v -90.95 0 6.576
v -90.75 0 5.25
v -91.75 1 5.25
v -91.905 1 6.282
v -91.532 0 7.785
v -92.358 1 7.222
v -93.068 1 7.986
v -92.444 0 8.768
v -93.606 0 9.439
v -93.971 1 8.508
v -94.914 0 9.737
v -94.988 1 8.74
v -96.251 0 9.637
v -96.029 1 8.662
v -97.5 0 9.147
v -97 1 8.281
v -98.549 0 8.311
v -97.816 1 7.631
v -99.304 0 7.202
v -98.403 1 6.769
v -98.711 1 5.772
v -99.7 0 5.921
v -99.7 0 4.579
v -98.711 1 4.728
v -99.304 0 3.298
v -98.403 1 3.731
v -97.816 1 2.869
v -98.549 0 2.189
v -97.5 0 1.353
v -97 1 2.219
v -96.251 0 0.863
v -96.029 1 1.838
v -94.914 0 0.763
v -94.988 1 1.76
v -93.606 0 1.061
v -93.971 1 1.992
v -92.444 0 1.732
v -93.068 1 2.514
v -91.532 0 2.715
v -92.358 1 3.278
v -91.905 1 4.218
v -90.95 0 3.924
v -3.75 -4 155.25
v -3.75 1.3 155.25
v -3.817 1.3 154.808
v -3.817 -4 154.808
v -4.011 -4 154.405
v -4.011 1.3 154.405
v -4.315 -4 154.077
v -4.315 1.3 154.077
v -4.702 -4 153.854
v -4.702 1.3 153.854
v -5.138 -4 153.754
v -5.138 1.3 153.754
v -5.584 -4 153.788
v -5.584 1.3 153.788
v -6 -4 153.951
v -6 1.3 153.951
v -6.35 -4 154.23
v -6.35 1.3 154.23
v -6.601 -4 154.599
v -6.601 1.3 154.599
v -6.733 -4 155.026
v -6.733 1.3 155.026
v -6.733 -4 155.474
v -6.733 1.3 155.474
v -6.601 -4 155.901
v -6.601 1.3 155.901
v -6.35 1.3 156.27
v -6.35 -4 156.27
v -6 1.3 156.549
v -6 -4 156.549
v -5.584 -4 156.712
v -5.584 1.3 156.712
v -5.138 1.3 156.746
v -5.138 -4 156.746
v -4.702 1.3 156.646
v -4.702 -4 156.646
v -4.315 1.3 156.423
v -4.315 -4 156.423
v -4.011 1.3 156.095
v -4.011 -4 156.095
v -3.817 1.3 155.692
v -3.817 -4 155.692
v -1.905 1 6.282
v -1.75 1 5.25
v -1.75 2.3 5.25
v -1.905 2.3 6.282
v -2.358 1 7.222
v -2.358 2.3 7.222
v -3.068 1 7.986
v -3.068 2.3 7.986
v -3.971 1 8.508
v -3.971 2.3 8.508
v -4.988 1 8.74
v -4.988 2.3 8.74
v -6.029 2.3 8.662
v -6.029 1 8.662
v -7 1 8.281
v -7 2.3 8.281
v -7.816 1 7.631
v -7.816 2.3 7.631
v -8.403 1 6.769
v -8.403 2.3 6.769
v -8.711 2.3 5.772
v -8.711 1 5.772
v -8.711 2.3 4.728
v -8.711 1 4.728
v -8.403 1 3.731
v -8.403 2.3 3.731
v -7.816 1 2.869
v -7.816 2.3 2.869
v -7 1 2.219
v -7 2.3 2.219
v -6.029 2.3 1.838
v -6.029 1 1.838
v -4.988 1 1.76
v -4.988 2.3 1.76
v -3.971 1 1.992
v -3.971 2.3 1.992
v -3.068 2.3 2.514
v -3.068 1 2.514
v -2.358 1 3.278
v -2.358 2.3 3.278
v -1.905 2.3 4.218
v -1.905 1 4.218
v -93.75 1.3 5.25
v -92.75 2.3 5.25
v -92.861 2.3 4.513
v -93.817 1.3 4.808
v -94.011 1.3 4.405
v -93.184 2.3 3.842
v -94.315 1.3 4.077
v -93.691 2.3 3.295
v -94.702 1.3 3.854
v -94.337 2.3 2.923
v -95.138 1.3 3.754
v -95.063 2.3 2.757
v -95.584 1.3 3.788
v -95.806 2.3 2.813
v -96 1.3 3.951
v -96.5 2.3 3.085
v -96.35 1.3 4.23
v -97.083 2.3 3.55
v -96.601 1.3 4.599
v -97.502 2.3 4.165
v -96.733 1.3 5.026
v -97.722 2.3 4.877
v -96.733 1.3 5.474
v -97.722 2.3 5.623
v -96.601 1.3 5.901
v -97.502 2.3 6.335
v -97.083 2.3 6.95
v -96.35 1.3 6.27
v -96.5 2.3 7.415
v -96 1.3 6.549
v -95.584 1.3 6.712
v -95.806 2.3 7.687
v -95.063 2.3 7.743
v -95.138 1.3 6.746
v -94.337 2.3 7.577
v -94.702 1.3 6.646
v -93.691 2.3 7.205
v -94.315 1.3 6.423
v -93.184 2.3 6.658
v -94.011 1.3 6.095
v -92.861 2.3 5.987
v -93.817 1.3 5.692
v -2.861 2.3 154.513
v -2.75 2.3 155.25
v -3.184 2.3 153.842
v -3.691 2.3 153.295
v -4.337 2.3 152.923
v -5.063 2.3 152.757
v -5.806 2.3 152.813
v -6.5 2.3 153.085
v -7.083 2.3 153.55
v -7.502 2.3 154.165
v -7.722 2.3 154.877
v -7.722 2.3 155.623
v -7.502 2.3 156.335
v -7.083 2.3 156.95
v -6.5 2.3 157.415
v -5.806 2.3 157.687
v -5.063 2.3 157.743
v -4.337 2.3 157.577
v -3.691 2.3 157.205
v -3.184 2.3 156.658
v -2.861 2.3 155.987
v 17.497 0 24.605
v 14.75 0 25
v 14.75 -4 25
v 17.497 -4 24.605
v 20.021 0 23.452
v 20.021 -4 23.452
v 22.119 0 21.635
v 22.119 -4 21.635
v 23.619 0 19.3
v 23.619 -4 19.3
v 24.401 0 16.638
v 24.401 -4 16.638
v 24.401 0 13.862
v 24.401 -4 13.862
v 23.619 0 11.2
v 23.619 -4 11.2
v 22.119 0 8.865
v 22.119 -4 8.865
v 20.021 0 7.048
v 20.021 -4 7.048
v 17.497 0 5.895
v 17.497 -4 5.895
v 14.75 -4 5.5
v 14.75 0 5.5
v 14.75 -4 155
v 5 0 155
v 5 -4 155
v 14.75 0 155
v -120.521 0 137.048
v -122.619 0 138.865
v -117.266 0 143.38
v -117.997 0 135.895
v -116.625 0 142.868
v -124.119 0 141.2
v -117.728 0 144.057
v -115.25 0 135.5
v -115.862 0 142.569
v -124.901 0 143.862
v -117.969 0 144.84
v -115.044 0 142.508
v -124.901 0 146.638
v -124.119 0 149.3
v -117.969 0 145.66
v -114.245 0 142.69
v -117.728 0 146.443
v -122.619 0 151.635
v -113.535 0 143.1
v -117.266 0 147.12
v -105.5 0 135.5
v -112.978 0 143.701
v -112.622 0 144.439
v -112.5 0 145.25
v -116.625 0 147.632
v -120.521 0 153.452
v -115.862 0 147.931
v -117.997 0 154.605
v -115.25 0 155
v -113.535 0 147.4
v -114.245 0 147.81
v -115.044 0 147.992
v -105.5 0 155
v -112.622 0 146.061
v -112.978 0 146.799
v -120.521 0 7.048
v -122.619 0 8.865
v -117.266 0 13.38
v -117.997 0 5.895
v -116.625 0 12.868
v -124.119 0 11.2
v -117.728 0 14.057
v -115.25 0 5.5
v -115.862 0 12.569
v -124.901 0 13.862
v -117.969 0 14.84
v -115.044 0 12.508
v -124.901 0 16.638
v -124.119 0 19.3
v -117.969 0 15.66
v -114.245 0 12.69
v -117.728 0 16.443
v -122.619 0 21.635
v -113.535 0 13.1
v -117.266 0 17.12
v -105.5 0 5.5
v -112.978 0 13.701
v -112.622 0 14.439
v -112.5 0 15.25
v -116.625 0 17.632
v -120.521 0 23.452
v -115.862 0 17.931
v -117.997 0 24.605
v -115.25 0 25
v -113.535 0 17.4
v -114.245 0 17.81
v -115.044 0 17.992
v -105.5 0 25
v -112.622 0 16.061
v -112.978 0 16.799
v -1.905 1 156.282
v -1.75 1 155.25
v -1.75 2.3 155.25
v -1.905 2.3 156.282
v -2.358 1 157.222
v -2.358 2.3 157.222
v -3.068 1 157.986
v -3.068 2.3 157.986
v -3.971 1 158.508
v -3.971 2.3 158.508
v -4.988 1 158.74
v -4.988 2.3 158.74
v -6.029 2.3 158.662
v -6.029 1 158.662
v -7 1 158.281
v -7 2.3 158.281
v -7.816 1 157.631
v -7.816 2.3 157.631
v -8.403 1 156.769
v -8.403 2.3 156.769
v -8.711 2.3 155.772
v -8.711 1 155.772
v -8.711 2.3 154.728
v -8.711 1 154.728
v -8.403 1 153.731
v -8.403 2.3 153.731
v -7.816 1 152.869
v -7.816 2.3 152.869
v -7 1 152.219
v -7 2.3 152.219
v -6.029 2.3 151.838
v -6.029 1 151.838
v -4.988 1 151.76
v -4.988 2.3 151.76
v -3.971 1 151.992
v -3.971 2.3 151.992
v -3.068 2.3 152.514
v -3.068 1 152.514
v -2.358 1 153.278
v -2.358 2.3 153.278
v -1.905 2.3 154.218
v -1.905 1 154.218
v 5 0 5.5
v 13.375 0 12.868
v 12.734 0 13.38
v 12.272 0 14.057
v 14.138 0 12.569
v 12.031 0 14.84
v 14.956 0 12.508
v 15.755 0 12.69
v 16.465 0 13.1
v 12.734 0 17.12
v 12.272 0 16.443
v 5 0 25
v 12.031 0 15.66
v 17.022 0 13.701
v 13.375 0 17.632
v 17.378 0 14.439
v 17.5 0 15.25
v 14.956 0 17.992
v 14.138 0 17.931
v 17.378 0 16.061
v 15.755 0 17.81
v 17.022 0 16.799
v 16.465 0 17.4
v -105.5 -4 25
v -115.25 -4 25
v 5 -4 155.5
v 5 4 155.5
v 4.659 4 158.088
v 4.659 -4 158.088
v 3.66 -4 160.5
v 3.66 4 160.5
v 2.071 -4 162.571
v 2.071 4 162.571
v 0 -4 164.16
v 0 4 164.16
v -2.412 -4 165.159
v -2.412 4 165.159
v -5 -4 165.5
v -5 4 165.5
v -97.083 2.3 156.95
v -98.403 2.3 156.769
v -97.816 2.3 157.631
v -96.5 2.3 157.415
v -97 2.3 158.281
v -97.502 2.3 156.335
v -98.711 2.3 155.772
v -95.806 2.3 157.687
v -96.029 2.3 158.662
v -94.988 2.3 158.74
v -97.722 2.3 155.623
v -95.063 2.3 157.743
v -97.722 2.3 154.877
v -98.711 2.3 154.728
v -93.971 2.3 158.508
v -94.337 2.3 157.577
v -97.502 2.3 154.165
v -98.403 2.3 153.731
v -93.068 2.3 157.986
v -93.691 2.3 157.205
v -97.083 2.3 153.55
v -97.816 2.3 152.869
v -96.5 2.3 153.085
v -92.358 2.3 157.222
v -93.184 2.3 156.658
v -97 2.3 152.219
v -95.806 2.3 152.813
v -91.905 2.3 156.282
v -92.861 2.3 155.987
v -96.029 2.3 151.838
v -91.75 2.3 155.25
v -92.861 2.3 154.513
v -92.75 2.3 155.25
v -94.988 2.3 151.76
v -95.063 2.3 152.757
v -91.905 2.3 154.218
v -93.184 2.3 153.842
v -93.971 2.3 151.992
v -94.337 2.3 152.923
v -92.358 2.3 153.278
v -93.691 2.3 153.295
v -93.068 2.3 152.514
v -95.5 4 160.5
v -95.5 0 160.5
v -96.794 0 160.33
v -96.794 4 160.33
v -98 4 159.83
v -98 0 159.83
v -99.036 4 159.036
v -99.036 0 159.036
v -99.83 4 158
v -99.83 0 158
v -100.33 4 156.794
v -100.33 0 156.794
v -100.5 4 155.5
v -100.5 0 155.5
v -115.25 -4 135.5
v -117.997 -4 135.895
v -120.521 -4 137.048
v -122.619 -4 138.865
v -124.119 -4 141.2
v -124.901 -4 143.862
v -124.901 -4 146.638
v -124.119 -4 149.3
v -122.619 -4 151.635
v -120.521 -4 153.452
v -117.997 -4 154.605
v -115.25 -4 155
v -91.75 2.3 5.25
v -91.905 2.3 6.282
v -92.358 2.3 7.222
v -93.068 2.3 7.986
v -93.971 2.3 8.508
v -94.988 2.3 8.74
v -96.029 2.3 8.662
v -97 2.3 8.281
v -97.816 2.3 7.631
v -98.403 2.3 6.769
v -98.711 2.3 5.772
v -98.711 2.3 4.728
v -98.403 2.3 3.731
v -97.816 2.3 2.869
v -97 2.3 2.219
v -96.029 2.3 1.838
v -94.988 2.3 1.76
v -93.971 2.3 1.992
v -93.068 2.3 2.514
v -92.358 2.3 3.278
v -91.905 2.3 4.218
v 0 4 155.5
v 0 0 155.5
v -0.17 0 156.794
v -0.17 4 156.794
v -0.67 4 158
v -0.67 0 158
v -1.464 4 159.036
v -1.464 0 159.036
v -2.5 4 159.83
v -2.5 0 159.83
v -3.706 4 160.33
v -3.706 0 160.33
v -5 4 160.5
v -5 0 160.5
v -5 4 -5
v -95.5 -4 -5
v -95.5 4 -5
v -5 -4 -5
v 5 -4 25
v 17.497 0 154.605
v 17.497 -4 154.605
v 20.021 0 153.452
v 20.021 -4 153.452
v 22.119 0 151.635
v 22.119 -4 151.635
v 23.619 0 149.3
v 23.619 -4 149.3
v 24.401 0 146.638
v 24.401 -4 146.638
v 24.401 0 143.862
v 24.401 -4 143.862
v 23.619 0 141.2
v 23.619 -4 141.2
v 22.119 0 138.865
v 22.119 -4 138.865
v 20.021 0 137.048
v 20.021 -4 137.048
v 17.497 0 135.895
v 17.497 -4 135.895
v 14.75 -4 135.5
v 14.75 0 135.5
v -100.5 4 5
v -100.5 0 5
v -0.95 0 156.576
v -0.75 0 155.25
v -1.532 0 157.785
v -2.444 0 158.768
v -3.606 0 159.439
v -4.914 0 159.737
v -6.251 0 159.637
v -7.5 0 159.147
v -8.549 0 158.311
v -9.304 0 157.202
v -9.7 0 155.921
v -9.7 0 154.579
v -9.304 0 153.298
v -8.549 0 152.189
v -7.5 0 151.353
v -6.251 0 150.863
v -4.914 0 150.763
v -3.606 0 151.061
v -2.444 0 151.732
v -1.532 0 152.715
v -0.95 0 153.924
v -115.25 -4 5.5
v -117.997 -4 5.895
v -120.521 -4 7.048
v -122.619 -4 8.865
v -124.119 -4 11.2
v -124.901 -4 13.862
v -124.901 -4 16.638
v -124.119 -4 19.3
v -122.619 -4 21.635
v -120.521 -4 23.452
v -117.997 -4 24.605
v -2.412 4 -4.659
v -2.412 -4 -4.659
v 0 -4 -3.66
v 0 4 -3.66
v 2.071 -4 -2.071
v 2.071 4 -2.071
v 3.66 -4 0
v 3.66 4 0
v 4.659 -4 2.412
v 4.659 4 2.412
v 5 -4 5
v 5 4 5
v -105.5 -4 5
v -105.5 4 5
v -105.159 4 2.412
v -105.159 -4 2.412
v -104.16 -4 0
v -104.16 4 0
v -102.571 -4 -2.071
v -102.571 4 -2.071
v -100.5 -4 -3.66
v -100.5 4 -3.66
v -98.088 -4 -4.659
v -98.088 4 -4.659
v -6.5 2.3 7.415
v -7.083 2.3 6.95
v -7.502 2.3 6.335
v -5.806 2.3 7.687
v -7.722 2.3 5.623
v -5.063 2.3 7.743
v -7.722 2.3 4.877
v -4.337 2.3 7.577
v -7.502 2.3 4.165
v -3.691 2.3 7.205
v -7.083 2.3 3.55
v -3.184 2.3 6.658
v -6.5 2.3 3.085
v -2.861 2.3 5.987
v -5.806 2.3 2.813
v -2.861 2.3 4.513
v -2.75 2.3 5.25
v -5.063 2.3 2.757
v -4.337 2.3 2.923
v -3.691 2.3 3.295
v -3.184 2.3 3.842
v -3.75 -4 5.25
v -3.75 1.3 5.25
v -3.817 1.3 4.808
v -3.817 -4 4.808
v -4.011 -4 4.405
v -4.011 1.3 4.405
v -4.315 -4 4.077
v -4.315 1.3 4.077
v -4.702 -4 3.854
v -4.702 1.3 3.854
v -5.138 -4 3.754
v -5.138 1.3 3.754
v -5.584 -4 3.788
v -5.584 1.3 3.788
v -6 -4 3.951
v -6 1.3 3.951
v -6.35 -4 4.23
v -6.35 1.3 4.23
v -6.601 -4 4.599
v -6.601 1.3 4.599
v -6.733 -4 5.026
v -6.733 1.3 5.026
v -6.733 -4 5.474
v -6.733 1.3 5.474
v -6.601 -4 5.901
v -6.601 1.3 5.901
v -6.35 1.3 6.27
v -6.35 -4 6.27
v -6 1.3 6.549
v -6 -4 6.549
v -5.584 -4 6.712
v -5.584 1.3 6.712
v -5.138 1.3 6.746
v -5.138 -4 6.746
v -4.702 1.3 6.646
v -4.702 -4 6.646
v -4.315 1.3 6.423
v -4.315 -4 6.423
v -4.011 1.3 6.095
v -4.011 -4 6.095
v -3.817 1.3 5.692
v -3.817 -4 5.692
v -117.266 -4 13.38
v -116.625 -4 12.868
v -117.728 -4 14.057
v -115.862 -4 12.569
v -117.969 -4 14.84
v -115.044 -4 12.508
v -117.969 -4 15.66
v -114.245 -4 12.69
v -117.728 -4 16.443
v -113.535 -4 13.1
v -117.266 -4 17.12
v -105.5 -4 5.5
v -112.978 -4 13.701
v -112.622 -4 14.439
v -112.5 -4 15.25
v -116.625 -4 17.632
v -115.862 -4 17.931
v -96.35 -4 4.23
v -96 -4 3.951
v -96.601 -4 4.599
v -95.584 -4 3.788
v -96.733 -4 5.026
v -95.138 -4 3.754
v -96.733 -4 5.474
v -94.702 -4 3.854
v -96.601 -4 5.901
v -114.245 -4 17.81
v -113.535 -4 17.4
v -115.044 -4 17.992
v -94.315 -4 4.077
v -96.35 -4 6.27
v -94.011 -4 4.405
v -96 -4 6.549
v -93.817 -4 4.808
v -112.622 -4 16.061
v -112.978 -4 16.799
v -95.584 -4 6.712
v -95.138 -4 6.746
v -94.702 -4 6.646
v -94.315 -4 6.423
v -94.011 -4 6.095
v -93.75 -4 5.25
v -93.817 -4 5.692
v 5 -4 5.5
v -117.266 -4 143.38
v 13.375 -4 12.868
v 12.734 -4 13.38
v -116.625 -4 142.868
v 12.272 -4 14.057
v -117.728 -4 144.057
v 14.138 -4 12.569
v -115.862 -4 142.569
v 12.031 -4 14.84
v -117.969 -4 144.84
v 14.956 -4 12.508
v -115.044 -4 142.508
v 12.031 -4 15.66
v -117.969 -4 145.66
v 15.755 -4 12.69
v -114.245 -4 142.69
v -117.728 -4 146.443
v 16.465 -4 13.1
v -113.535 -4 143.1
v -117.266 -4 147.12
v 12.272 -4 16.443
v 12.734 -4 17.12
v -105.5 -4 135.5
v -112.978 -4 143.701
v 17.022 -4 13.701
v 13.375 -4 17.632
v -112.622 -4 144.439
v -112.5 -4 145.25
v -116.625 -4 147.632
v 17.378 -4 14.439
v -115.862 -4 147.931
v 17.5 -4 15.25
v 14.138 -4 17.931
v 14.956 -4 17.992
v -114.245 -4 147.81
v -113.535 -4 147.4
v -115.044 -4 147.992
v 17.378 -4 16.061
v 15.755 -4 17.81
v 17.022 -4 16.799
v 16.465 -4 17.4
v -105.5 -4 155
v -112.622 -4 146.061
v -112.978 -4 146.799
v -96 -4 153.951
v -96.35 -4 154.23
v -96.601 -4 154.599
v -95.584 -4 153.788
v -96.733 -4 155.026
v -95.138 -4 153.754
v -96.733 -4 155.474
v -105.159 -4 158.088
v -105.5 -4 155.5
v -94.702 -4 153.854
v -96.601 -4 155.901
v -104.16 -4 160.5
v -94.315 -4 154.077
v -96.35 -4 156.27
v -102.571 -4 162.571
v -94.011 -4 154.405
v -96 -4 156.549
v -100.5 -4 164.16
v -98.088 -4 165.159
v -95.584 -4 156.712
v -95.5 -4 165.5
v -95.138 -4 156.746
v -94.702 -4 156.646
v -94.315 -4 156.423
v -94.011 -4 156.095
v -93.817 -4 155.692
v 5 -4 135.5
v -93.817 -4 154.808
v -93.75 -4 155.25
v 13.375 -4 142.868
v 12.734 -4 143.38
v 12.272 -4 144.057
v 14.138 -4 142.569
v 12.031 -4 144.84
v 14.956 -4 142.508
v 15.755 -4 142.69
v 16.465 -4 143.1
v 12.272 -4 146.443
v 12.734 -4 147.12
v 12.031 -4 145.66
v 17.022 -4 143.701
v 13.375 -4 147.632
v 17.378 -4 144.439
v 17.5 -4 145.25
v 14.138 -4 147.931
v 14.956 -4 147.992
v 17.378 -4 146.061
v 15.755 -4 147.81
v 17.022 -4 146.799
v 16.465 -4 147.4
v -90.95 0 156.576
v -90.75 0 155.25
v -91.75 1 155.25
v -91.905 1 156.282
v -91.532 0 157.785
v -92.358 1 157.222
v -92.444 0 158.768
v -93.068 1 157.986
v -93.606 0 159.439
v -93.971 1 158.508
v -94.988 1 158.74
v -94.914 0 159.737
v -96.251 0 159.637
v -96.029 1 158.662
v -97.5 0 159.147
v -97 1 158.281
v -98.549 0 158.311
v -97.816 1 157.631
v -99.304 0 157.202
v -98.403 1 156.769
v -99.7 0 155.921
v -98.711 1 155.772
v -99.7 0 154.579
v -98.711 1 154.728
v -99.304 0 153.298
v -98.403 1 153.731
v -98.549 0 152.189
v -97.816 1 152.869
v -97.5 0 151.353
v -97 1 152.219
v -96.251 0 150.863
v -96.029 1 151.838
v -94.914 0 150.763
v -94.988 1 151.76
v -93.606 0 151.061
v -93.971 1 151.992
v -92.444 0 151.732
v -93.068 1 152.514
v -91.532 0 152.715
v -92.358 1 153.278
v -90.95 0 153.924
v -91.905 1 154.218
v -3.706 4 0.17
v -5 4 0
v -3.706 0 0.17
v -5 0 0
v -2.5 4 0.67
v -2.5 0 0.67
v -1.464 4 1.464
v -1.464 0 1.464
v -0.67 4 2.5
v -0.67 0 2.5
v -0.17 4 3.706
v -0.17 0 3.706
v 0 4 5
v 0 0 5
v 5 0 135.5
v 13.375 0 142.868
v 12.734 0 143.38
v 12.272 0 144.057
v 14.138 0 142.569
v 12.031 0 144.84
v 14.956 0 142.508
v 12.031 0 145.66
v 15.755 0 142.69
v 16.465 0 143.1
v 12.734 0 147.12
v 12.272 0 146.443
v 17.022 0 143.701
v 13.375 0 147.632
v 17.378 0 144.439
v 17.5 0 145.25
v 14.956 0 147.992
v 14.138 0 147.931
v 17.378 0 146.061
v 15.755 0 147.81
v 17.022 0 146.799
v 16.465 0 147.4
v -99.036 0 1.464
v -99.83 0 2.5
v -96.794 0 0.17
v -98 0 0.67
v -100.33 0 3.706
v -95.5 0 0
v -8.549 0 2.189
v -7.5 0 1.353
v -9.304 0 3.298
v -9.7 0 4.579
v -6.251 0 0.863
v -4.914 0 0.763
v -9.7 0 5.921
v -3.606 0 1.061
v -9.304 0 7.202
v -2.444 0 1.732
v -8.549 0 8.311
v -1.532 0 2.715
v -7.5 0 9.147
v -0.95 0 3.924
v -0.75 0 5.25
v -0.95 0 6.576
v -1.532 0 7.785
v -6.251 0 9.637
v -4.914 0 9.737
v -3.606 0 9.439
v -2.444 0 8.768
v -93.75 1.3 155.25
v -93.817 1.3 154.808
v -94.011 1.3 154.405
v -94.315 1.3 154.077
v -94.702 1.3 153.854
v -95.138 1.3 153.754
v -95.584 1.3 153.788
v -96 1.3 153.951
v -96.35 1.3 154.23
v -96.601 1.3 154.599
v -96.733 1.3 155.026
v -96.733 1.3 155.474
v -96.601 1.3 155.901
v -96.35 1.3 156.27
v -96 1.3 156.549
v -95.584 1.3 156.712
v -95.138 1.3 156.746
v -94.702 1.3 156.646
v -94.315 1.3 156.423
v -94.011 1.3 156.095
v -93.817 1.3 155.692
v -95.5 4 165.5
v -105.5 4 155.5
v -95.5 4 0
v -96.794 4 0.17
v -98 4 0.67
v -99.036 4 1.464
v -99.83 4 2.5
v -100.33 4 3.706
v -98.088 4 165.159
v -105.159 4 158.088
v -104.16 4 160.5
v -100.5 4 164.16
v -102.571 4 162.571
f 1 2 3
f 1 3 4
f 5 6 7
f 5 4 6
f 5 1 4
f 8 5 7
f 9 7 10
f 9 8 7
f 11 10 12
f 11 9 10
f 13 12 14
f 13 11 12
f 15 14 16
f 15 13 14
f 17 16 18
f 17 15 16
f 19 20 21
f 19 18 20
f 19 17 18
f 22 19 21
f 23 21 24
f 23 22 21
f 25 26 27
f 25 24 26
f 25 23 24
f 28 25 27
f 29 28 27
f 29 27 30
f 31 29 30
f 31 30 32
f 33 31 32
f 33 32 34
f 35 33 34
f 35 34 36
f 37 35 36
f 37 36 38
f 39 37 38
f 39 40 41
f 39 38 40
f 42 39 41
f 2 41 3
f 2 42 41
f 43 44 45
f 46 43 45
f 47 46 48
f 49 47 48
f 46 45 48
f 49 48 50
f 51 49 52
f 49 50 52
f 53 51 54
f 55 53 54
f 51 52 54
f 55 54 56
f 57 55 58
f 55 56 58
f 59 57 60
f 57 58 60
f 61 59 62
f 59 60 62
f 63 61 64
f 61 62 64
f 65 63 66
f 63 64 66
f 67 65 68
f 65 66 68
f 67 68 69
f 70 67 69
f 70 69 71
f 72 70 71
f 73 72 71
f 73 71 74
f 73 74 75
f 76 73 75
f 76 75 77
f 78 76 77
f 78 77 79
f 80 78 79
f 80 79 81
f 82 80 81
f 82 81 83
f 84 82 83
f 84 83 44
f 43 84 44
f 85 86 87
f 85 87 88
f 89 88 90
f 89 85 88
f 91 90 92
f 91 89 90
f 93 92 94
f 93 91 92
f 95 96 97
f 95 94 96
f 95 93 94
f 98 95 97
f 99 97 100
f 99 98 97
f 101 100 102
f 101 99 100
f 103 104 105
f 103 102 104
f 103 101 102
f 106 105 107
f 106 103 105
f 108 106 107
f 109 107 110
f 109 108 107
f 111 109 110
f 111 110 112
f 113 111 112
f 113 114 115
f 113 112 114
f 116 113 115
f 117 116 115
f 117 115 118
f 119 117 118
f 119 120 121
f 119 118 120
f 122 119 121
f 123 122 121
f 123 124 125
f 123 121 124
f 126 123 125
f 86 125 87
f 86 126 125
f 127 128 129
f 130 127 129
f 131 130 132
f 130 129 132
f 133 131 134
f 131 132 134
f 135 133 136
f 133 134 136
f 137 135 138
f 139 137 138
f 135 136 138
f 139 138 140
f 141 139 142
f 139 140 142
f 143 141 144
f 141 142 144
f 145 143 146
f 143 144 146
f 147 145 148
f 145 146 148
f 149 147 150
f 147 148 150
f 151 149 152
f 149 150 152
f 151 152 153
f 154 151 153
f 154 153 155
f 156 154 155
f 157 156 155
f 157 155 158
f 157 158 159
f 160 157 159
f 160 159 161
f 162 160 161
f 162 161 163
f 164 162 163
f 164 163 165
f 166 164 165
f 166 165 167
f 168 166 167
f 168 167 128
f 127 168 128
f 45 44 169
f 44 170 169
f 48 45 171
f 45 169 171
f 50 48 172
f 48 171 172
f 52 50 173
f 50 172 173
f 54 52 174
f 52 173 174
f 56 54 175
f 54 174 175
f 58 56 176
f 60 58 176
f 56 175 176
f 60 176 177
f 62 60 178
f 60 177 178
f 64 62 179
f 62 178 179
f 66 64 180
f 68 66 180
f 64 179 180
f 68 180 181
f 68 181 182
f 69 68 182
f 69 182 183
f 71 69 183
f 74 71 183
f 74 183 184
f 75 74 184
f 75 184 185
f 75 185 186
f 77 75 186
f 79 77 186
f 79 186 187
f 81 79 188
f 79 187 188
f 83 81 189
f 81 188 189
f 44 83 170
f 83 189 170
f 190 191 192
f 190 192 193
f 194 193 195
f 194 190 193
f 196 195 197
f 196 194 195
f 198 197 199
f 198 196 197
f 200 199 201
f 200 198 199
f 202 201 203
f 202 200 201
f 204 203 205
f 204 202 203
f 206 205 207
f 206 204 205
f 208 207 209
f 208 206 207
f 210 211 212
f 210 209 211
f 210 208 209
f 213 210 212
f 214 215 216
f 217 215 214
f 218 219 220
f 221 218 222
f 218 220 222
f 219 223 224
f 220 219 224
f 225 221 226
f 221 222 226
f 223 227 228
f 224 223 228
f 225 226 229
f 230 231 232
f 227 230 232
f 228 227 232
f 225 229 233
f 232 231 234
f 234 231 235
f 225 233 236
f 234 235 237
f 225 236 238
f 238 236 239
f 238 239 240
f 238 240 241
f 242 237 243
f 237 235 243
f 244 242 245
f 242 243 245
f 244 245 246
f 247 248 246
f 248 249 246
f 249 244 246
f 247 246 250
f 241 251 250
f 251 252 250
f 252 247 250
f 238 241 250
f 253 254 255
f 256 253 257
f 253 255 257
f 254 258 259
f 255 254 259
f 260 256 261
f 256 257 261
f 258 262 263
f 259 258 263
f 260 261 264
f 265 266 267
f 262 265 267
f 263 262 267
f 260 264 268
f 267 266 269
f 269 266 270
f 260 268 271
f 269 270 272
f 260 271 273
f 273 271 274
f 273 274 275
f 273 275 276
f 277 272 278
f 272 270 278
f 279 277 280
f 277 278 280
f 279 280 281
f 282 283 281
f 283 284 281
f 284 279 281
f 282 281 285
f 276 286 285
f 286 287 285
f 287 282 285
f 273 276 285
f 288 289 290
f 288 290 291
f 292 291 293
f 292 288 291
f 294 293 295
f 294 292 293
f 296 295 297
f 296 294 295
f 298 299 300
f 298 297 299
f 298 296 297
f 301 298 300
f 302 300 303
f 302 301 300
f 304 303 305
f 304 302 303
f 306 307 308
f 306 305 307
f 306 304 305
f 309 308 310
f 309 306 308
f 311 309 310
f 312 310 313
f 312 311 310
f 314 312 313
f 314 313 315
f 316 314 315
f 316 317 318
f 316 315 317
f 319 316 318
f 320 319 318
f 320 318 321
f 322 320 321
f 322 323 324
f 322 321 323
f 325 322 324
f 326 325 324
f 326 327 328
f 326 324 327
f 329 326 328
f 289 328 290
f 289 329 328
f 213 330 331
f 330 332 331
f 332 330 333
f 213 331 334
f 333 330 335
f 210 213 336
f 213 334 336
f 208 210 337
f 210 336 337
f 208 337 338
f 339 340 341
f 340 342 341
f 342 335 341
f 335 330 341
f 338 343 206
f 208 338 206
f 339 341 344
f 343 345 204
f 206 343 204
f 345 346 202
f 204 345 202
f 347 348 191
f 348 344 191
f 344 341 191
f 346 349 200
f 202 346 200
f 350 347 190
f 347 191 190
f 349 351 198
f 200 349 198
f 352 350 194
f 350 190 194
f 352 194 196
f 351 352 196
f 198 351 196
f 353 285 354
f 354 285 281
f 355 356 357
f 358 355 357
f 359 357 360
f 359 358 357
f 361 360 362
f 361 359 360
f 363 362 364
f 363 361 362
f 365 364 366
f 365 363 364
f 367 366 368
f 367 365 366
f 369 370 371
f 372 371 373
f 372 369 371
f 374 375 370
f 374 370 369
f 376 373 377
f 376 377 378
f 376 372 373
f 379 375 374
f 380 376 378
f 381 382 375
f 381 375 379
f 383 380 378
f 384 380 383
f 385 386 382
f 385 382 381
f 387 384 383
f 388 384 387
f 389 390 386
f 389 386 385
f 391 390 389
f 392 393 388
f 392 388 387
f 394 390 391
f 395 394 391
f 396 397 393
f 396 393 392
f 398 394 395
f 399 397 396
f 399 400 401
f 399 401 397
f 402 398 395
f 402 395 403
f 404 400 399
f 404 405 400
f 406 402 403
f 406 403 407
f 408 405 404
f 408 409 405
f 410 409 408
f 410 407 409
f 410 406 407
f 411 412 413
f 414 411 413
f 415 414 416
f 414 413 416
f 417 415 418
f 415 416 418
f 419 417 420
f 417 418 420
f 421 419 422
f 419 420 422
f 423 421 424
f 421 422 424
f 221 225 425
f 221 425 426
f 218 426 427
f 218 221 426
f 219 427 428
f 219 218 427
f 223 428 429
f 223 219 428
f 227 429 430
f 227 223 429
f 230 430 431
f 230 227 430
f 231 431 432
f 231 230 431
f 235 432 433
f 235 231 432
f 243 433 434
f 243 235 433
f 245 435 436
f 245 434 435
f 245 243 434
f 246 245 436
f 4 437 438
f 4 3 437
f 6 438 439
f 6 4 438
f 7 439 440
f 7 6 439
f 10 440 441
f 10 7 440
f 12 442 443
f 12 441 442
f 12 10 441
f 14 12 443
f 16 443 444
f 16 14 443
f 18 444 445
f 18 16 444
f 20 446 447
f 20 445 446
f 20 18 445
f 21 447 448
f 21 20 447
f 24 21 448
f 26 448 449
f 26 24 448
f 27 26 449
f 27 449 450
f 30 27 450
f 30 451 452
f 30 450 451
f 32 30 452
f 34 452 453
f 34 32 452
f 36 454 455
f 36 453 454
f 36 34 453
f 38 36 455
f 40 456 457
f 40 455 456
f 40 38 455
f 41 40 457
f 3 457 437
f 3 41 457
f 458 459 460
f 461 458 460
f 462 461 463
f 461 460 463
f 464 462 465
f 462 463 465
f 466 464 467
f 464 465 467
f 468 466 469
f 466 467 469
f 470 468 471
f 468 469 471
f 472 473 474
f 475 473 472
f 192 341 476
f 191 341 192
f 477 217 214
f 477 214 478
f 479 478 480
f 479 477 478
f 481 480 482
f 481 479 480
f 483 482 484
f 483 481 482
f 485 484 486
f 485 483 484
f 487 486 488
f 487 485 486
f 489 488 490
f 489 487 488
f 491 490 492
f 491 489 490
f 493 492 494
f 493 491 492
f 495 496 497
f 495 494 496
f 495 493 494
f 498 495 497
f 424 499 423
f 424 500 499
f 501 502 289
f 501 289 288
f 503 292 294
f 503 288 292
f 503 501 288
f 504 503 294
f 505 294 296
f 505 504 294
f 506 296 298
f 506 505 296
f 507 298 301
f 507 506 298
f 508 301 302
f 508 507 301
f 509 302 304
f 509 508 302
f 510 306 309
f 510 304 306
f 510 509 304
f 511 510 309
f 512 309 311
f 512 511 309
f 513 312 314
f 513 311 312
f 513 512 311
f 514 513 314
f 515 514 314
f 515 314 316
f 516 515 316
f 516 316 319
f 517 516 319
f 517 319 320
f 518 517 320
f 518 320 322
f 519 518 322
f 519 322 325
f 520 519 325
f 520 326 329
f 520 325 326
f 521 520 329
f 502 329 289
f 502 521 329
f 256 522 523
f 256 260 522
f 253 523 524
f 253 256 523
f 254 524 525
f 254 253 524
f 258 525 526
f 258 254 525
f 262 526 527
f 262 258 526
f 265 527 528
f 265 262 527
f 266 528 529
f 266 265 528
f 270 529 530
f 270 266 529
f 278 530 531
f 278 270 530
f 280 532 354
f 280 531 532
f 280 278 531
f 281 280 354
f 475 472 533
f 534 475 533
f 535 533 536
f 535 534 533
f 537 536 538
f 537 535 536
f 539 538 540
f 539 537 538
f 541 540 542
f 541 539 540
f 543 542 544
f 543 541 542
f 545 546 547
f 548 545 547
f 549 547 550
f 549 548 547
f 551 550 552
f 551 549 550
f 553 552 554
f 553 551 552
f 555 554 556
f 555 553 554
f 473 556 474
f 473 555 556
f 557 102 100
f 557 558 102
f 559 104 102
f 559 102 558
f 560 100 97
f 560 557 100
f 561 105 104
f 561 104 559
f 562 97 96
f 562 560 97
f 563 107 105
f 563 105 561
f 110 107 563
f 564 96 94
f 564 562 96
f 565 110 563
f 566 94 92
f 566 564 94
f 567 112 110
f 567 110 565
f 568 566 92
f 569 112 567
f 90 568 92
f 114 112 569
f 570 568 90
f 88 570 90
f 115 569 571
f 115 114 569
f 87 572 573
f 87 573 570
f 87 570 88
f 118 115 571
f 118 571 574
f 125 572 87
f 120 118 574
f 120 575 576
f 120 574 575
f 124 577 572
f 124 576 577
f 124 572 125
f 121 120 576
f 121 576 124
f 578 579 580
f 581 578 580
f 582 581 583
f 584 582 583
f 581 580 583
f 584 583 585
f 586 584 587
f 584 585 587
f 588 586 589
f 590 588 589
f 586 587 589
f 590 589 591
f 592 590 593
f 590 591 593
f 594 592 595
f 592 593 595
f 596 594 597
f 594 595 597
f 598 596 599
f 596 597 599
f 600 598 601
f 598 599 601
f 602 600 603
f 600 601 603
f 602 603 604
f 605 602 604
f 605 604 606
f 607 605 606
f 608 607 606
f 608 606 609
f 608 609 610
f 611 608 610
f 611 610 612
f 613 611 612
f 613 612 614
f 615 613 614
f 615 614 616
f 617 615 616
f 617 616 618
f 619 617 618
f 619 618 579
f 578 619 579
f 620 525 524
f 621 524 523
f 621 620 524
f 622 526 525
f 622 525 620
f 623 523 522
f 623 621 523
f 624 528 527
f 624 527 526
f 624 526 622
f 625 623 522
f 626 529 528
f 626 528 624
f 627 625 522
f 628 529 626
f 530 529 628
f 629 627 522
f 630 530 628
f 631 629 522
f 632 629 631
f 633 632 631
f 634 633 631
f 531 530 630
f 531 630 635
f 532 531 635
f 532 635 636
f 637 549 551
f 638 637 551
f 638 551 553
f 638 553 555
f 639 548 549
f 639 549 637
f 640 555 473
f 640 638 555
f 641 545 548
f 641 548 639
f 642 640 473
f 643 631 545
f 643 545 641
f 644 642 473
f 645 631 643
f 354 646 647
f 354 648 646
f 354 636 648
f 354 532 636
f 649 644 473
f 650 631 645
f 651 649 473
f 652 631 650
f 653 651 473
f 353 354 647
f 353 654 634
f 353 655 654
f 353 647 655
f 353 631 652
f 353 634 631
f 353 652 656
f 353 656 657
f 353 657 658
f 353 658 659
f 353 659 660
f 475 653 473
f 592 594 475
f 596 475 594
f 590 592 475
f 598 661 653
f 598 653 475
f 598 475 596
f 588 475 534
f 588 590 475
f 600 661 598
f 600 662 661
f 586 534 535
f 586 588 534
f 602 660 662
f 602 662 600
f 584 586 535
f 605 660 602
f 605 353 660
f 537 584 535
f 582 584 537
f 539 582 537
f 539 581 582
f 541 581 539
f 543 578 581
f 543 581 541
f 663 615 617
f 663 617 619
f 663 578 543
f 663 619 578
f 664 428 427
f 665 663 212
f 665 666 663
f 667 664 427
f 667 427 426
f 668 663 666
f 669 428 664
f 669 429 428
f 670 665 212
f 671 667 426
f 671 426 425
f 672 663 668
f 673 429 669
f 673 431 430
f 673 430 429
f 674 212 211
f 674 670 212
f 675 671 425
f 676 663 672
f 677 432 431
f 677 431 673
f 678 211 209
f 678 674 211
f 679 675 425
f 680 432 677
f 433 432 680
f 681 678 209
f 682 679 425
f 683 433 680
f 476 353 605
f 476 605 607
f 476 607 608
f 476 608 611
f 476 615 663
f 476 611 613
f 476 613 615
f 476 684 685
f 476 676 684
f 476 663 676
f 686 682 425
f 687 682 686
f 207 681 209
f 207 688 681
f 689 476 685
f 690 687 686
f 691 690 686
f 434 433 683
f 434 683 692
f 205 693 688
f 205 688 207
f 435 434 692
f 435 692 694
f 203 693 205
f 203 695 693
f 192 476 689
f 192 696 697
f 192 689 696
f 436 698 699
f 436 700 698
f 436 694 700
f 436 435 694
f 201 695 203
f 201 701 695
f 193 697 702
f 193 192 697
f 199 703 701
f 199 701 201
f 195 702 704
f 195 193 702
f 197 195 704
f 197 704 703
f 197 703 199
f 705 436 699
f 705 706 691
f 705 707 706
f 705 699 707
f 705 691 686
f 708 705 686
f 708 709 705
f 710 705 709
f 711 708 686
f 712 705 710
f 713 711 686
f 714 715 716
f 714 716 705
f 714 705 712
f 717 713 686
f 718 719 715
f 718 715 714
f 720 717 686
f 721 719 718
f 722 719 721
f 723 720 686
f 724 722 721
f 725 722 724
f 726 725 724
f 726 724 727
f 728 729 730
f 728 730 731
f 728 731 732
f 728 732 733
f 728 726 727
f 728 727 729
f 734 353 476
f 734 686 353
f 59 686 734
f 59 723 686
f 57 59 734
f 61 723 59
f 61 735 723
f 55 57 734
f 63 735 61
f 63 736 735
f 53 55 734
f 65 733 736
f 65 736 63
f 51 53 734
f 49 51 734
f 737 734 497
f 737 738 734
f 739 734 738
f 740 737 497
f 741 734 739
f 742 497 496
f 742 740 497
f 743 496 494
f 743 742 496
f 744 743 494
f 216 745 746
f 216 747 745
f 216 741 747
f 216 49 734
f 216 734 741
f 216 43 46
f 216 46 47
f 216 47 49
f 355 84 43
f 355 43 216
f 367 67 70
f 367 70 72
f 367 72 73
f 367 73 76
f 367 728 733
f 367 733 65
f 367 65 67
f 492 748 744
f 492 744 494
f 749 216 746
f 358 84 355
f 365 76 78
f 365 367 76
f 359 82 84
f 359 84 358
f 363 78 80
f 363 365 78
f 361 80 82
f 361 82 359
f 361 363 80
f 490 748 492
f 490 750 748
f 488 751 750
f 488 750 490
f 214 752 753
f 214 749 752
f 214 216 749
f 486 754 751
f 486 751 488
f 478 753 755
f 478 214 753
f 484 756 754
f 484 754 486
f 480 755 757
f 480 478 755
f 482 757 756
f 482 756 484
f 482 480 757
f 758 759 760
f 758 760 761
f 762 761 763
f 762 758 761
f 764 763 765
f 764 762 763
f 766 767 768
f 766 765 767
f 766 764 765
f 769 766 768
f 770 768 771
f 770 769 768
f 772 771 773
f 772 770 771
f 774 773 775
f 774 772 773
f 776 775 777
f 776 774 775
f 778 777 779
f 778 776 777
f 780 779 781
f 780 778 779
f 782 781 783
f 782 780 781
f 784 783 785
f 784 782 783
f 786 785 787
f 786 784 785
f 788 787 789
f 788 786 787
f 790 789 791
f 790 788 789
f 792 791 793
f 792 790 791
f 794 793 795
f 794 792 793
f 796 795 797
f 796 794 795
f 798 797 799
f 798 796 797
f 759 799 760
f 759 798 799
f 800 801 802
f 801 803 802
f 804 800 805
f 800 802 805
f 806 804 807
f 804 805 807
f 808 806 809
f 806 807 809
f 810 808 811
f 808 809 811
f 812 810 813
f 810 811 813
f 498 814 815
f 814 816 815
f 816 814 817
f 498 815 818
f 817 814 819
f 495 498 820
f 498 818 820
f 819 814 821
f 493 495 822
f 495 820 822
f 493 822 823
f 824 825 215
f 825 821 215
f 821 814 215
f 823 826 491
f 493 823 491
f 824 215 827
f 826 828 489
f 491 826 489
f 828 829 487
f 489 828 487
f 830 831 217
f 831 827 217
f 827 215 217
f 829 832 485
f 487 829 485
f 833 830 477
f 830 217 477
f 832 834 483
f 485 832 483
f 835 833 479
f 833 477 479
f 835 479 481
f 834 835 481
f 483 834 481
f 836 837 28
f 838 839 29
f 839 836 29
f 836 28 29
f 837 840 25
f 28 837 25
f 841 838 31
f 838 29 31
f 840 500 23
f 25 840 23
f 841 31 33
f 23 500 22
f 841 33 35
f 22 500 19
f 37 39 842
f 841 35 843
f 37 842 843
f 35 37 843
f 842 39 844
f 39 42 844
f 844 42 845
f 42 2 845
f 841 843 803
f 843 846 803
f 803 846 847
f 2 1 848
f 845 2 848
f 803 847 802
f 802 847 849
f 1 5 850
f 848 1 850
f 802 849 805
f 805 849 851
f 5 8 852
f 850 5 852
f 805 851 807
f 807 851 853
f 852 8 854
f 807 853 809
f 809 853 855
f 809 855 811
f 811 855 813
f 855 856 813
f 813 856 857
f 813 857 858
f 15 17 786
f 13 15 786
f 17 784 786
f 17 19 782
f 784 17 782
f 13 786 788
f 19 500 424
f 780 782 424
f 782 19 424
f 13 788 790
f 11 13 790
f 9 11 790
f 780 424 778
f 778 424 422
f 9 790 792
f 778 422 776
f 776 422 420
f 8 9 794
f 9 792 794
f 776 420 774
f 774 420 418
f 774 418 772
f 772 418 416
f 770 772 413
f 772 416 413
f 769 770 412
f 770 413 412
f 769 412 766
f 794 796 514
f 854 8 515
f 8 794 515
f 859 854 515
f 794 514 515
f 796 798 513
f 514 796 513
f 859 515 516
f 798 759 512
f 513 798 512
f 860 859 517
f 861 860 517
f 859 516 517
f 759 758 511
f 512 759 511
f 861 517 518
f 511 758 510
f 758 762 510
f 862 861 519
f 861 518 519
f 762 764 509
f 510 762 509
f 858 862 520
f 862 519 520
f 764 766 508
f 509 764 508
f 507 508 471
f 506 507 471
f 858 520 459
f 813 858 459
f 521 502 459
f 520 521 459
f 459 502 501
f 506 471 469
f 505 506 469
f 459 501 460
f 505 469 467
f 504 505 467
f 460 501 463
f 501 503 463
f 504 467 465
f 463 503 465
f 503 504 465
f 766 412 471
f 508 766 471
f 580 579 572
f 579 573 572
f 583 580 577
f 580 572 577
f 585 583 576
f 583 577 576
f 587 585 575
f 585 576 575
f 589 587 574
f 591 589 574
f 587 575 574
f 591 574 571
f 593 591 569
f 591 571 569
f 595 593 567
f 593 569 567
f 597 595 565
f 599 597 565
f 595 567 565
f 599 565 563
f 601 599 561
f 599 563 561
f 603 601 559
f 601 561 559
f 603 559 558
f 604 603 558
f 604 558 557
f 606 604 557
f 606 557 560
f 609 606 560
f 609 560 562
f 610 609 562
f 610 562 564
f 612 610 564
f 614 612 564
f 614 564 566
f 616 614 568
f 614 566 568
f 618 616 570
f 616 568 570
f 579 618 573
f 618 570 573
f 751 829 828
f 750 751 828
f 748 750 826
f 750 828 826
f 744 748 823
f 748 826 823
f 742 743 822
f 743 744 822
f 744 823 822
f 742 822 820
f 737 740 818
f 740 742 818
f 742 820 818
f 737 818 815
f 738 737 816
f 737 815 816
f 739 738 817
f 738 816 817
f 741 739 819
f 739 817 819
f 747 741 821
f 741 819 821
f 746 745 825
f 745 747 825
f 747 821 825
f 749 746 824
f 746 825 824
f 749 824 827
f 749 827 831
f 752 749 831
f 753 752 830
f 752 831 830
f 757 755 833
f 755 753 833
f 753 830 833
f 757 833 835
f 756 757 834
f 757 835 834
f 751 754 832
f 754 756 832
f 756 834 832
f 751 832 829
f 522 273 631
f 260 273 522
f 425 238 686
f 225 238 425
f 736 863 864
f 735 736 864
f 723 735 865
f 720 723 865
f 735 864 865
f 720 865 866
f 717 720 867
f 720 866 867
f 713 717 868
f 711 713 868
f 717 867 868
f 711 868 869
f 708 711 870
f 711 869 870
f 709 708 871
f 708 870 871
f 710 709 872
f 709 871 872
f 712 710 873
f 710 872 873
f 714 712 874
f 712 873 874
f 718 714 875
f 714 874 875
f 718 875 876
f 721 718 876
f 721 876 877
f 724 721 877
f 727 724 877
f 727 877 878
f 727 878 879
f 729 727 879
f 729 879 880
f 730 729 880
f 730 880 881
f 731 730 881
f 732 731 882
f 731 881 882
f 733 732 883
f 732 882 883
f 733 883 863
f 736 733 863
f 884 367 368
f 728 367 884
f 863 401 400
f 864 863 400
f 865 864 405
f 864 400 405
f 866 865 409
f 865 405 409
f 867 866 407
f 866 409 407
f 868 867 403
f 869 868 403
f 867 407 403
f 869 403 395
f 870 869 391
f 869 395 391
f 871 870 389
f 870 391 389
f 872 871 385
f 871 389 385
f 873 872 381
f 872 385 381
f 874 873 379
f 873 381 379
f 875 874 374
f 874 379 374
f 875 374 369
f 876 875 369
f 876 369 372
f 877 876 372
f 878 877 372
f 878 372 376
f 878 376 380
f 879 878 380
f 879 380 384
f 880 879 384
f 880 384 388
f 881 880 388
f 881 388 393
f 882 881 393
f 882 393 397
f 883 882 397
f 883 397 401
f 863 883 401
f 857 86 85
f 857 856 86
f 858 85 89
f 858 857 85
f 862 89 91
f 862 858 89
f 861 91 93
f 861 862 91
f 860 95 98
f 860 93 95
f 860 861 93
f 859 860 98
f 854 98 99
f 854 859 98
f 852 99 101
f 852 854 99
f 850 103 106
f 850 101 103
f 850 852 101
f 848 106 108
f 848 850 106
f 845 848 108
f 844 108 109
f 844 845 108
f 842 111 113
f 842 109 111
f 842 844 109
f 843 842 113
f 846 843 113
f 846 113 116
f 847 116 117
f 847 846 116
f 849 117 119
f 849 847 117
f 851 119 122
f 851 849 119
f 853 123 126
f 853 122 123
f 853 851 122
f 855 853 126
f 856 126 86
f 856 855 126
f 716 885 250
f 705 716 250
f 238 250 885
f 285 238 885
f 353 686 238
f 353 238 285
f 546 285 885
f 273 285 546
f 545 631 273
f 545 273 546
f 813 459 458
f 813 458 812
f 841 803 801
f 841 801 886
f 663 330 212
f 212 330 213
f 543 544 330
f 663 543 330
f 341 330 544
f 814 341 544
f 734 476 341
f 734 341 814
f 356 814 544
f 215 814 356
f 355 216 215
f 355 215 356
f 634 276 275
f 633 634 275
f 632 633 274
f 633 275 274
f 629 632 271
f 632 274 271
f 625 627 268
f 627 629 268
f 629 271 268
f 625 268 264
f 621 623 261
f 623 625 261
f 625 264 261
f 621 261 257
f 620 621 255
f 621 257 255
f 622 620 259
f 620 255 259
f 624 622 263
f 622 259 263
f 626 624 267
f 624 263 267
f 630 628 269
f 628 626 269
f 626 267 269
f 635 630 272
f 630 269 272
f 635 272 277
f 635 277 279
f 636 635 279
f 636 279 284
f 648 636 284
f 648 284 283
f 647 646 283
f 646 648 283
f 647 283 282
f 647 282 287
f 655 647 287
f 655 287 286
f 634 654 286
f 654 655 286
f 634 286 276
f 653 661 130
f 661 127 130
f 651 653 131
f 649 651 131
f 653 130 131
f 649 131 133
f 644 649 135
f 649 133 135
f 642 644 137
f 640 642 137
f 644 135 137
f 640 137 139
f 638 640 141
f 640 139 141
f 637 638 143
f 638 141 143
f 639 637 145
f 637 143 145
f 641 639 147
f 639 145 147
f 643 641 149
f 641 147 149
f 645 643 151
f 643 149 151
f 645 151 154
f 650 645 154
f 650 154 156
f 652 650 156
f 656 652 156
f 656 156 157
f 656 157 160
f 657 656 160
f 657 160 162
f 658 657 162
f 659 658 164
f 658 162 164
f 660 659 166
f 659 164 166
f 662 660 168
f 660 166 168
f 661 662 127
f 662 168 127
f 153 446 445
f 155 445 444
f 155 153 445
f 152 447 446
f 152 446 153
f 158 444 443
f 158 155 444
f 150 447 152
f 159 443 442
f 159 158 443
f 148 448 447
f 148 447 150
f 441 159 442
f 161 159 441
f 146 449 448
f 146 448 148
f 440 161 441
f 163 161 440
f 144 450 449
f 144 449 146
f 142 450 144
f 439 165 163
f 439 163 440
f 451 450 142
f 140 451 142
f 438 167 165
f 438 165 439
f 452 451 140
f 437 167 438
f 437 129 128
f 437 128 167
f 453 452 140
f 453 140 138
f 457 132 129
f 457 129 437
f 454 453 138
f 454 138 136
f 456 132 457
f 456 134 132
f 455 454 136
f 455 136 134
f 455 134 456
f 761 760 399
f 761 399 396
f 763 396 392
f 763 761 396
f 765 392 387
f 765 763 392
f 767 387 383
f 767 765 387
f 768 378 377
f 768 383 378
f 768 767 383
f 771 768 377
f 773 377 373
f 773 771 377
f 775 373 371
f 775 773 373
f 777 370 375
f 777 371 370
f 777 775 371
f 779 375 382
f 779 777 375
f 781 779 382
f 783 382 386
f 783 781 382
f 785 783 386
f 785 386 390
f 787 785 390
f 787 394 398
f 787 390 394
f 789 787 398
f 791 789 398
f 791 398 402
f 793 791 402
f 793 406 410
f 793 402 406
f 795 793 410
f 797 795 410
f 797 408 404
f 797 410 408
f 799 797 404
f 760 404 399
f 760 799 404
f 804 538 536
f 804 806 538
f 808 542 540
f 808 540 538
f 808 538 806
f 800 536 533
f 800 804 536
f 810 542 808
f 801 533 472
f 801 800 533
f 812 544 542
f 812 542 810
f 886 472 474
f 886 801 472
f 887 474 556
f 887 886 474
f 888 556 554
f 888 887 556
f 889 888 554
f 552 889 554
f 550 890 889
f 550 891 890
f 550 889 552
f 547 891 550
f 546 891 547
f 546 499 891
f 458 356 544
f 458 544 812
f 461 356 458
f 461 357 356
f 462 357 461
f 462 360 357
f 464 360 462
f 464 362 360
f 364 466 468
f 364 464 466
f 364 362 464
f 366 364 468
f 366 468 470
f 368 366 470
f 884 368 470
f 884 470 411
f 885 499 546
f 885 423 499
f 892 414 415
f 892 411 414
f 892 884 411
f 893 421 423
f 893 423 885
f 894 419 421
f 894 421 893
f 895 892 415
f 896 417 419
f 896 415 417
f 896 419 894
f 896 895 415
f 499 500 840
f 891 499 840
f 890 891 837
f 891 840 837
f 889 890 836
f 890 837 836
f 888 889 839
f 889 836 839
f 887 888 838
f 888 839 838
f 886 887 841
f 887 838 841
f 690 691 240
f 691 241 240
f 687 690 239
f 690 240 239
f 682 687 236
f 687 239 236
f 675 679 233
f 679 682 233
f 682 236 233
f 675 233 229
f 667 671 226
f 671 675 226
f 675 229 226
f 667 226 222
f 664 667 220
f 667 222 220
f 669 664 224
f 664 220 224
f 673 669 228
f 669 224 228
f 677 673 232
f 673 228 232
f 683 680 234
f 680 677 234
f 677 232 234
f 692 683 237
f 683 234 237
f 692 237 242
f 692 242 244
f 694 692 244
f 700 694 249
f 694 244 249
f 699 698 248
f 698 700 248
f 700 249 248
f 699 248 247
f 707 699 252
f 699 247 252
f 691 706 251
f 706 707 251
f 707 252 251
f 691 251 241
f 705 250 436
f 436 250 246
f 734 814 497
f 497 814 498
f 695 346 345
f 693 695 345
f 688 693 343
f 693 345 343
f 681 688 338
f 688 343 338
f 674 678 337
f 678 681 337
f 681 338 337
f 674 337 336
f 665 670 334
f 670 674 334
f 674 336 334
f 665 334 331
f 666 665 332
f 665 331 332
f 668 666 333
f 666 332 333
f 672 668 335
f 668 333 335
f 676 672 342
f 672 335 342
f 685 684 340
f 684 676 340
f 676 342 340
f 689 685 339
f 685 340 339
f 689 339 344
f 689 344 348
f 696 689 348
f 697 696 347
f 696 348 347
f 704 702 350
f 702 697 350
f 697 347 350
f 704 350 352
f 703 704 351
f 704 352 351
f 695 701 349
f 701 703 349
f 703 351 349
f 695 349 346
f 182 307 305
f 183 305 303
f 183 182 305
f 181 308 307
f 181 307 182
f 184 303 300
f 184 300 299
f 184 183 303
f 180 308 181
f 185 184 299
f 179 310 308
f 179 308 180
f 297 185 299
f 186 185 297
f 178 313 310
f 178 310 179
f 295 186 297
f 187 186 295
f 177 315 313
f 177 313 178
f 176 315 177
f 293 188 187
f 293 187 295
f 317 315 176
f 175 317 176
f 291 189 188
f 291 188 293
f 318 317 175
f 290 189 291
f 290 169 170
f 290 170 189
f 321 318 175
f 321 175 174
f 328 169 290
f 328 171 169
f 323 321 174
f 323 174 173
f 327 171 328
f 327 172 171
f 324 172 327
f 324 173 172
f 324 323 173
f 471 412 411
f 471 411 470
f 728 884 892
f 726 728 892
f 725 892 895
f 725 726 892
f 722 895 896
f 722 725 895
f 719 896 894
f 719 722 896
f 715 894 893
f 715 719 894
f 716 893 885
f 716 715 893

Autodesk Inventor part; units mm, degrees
ref_plane "YZ Plane" through (0, 0, 0) normal (1, 0, 0) x (0, 1, 0)
ref_plane "XZ Plane" through (0, 0, 0) normal (0, 1, 0) x (-1, 0, 0)
ref_plane "XY Plane" through (0, 0, 0) normal (0, 0, 1) x (1, 0, 0)
sketch "Sketch1" plane through (0, 0, 0) normal (0, 1, 0) x (-1, 0, 0)
  line L0 (5, 0) -> (95.5, 0)
  line L1 (100.5, 5) -> (100.5, 155.5)
  line L2 (95.5, 160.5) -> (5, 160.5)
  line L3 (0, 155.5) -> (0, 5)
  arc A0 (100.5, 155.5) -> (95.5, 160.5) centre (95.5, 155.5) ccw
  arc A1 (95.5, 0) -> (100.5, 5) centre (95.5, 5) ccw
  arc A2 (0, 5) -> (5, 0) centre (5, 5) ccw
  arc A3 (5, 160.5) -> (0, 155.5) centre (5, 155.5) ccw
  line L4 (105.5, 155.5) -> (105.5, 5)
  arc A4 (95.5, -5) -> (105.5, 5) centre (95.5, 5) ccw
  line L5 (95.5, -5) -> (5, -5)
  arc A5 (-5, 5) -> (5, -5) centre (5, 5) ccw
  line L6 (-5, 5) -> (-5, 155.5)
  arc A6 (5, 165.5) -> (-5, 155.5) centre (5, 155.5) ccw
  line L7 (5, 165.5) -> (95.5, 165.5)
  arc A7 (105.5, 155.5) -> (95.5, 165.5) centre (95.5, 155.5) ccw
  point P0 (0, 0)
  point P1 (100.5, 160.5)
  point P2 (100.5, 0)
  point P3 (0, 160.5)
  dimension "d0" = 100.5
  dimension "d1" = 160.5
  dimension "d2" = 5
  dimension "d3" = 5
extrude "Extrusion1" add sketch "Sketch1" along normal blind 4
sketch "Sketch2" plane through (0, 0, 0) normal (0, -1, 0) x (1, 0, 0)
  line L0 (5, 155.5) -> (5, 5) projected
  arc A0 (5, 155.5) -> (-5, 165.5) centre (-5, 155.5) ccw projected
  line L1 (-95.5, 165.5) -> (-5, 165.5) projected
  arc A1 (-95.5, 165.5) -> (-105.5, 155.5) centre (-95.5, 155.5) ccw projected
  line L2 (-105.5, 5) -> (-105.5, 155.5) projected
  arc A2 (-105.5, 5) -> (-95.5, -5) centre (-95.5, 5) ccw projected
  line L3 (-5, -5) -> (-95.5, -5) projected
  arc A3 (-5, -5) -> (5, 5) centre (-5, 5) ccw projected
  arc A4 (-5, 0) -> (0, 5) centre (-5, 5) ccw projected
  line L4 (-95.5, 0) -> (-5, 0) projected
  arc A5 (-100.5, 5) -> (-95.5, 0) centre (-95.5, 5) ccw projected
  line L5 (-100.5, 155.5) -> (-100.5, 5) projected
  arc A6 (-95.5, 160.5) -> (-100.5, 155.5) centre (-95.5, 155.5) ccw projected
  line L6 (-5, 160.5) -> (-95.5, 160.5) projected
  arc A7 (0, 155.5) -> (-5, 160.5) centre (-5, 155.5) ccw projected
  line L7 (0, 5) -> (0, 155.5) projected
  line L8 (14.75, 145.25) -> (-115.25, 145.25) construction
  line L9 (-115.25, 145.25) -> (-115.25, 15.25) construction
  line L10 (-115.25, 15.25) -> (14.75, 15.25) construction
  line L11 (14.75, 15.25) -> (14.75, 145.25) construction
  circle A8 centre (14.75, 145.25) radius 2.75
  arc A9 (14.75, 135.5) -> (14.75, 155) centre (14.75, 145.25) ccw
  line L12 (5, 155.5) -> (5, 5) projected
  line L13 (5, 155.5) -> (5, 5) projected
  line L14 (5, 135.5) -> (14.75, 135.5)
  line L15 (5, 155) -> (14.75, 155)
  line L16 (0, 5) -> (0, 155.5) construction
  line L17 (0, 80.25) -> (-100.5, 80.25) construction
  line L18 (-100.5, 155.5) -> (-100.5, 5) construction
  line L19 (-50.25, 80.25) -> (-50.25, 145.25) construction
  circle A10 centre (14.75, 15.25) radius 2.75
  arc A11 (14.75, 5.5) -> (14.75, 25) centre (14.75, 15.25) ccw
  line L20 (5, 25) -> (14.75, 25)
  line L21 (5, 5.5) -> (14.75, 5.5)
  circle A12 centre (-115.25, 145.25) radius 2.75
  arc A13 (-115.25, 155) -> (-115.25, 135.5) centre (-115.25, 145.25) ccw
  line L22 (-105.5, 135.5) -> (-115.25, 135.5)
  line L23 (-105.5, 155) -> (-115.25, 155)
  arc A14 (-115.25, 25) -> (-115.25, 5.5) centre (-115.25, 15.25) ccw
  line L24 (-105.5, 25) -> (-115.25, 25)
  circle A15 centre (-115.25, 15.25) radius 2.75
  line L25 (-105.5, 5.5) -> (-115.25, 5.5)
  point P0 (0, 0)
  dimension "d6" = 130
  dimension "d7" = 130
  dimension "d8" = 110.5
  dimension "d9" = 9.75
  dimension "d10" = 170.5
  dimension "d11" = 20.25
  dimension "d12" = 5.5
extrude "Extrusion2" add sketch "Sketch2" along normal blind 4 contours L0 A3 L3 A2 L2 A1 L1 A0 | L15 A9 L14 L0 | L20 A11 L21 L0 | L2 L22 A13 L23 | L2 L25 A14 L24 | L4 A5 L5 A6 L6 A7 L7 A4
sketch "Sketch3" plane through (0, 0, 0) normal (0, 1, 0) x (1, 0, 0)
  line L0 (-5.25, -155.25) -> (-95.25, -155.25) construction
  line L1 (-95.25, -155.25) -> (-95.25, -5.25) construction
  line L2 (-95.25, -5.25) -> (-5.25, -5.25) construction
  line L3 (-5.25, -5.25) -> (-5.25, -155.25) construction
  line L4 (-50.25, -155.25) -> (-50.25, -160.5) construction
  line L5 (-5, -160.5) -> (-95.5, -160.5) construction
  line L6 (-5.25, -80.25) -> (0, -80.25) construction
  line L7 (-50.25, -5.25) -> (-50.25, 0) construction
  line L8 (-95.5, 0) -> (-5, 0) construction
  line L9 (-95.25, -80.25) -> (-100.5, -80.25) construction
  line L10 (-100.5, -155.5) -> (-100.5, -5) construction
  line L11 (0, -5) -> (0, -155.5) projected
  line L12 (-100.5, -155.5) -> (-100.5, -5) projected
  arc A0 (-5, -160.5) -> (0, -155.5) centre (-5, -155.5) ccw projected
  arc A1 (-100.5, -155.5) -> (-95.5, -160.5) centre (-95.5, -155.5) ccw projected
  circle A2 centre (-5.25, -5.25) radius 3.5
  circle A3 centre (-5.25, -155.25) radius 3.5
  circle A4 centre (-95.25, -155.25) radius 3.5
  circle A5 centre (-95.25, -5.25) radius 3.5
  point P0 (0, 0)
  dimension "d15" = 90
  dimension "d16" = 150
  dimension "d17" = 7
  dimension "d18" = 7
  dimension "d19" = 7
  dimension "d20" = 7
extrude "Extrusion3" add sketch "Sketch3" along normal blind 2.3
sketch "Sketch4" plane through (-95.25, 2.3, 155.25) normal (0, 1, 0) x (1, 0, 0)
  circle A0 centre (90, 0) radius 3.5 projected
  circle A1 centre (0, 0) radius 3.5 projected
  circle A2 centre (90, 150) radius 3.5 projected
  circle A3 centre (0, 150) radius 3.5 projected
  circle A4 centre (90, 0) radius 1.5
  circle A5 centre (0, 0) radius 3.5 projected
  circle A6 centre (0, 0) radius 1.5
  circle A7 centre (90, 150) radius 3.5 projected
  circle A8 centre (90, 150) radius 1.5
  circle A9 centre (0, 150) radius 1.5
  point P0 (95.25, 155.25)
  dimension "d23" = 3
  dimension "d24" = 3
  dimension "d25" = 3
  dimension "d26" = 3
extrude "Extrusion4" cut sketch "Sketch4" against normal through all contours A4 | A6 | A8 | A9
chamfer "Chamfer1" distance 1 angle 45 4 edges at (-96.75, 2.3, 155.25) (-6.75, 2.3, 155.25) (-6.75, 2.3, 5.25) (-96.75, 2.3, 5.25)
chamfer "Chamfer2" distance 1 angle 45 4 edges at (-98.75, 0, 155.25) (-8.75, 0, 155.25) (-98.75, 0, 5.25) (-8.75, 0, 5.25)
equation "\"d9\" = -0.5 * d8 + 0.5 * d6"
equation "\"d11\" = -0.5 * d7 + 0.5 * d10"
equation "\"d18\" = d17"
equation "\"d19\" = d17"
equation "\"d20\" = d17"
equation "\"d24\" = d23"
equation "\"d25\" = d23"
equation "\"d26\" = d23"
properties part number "BTT Octopus 1.1 Mount"
